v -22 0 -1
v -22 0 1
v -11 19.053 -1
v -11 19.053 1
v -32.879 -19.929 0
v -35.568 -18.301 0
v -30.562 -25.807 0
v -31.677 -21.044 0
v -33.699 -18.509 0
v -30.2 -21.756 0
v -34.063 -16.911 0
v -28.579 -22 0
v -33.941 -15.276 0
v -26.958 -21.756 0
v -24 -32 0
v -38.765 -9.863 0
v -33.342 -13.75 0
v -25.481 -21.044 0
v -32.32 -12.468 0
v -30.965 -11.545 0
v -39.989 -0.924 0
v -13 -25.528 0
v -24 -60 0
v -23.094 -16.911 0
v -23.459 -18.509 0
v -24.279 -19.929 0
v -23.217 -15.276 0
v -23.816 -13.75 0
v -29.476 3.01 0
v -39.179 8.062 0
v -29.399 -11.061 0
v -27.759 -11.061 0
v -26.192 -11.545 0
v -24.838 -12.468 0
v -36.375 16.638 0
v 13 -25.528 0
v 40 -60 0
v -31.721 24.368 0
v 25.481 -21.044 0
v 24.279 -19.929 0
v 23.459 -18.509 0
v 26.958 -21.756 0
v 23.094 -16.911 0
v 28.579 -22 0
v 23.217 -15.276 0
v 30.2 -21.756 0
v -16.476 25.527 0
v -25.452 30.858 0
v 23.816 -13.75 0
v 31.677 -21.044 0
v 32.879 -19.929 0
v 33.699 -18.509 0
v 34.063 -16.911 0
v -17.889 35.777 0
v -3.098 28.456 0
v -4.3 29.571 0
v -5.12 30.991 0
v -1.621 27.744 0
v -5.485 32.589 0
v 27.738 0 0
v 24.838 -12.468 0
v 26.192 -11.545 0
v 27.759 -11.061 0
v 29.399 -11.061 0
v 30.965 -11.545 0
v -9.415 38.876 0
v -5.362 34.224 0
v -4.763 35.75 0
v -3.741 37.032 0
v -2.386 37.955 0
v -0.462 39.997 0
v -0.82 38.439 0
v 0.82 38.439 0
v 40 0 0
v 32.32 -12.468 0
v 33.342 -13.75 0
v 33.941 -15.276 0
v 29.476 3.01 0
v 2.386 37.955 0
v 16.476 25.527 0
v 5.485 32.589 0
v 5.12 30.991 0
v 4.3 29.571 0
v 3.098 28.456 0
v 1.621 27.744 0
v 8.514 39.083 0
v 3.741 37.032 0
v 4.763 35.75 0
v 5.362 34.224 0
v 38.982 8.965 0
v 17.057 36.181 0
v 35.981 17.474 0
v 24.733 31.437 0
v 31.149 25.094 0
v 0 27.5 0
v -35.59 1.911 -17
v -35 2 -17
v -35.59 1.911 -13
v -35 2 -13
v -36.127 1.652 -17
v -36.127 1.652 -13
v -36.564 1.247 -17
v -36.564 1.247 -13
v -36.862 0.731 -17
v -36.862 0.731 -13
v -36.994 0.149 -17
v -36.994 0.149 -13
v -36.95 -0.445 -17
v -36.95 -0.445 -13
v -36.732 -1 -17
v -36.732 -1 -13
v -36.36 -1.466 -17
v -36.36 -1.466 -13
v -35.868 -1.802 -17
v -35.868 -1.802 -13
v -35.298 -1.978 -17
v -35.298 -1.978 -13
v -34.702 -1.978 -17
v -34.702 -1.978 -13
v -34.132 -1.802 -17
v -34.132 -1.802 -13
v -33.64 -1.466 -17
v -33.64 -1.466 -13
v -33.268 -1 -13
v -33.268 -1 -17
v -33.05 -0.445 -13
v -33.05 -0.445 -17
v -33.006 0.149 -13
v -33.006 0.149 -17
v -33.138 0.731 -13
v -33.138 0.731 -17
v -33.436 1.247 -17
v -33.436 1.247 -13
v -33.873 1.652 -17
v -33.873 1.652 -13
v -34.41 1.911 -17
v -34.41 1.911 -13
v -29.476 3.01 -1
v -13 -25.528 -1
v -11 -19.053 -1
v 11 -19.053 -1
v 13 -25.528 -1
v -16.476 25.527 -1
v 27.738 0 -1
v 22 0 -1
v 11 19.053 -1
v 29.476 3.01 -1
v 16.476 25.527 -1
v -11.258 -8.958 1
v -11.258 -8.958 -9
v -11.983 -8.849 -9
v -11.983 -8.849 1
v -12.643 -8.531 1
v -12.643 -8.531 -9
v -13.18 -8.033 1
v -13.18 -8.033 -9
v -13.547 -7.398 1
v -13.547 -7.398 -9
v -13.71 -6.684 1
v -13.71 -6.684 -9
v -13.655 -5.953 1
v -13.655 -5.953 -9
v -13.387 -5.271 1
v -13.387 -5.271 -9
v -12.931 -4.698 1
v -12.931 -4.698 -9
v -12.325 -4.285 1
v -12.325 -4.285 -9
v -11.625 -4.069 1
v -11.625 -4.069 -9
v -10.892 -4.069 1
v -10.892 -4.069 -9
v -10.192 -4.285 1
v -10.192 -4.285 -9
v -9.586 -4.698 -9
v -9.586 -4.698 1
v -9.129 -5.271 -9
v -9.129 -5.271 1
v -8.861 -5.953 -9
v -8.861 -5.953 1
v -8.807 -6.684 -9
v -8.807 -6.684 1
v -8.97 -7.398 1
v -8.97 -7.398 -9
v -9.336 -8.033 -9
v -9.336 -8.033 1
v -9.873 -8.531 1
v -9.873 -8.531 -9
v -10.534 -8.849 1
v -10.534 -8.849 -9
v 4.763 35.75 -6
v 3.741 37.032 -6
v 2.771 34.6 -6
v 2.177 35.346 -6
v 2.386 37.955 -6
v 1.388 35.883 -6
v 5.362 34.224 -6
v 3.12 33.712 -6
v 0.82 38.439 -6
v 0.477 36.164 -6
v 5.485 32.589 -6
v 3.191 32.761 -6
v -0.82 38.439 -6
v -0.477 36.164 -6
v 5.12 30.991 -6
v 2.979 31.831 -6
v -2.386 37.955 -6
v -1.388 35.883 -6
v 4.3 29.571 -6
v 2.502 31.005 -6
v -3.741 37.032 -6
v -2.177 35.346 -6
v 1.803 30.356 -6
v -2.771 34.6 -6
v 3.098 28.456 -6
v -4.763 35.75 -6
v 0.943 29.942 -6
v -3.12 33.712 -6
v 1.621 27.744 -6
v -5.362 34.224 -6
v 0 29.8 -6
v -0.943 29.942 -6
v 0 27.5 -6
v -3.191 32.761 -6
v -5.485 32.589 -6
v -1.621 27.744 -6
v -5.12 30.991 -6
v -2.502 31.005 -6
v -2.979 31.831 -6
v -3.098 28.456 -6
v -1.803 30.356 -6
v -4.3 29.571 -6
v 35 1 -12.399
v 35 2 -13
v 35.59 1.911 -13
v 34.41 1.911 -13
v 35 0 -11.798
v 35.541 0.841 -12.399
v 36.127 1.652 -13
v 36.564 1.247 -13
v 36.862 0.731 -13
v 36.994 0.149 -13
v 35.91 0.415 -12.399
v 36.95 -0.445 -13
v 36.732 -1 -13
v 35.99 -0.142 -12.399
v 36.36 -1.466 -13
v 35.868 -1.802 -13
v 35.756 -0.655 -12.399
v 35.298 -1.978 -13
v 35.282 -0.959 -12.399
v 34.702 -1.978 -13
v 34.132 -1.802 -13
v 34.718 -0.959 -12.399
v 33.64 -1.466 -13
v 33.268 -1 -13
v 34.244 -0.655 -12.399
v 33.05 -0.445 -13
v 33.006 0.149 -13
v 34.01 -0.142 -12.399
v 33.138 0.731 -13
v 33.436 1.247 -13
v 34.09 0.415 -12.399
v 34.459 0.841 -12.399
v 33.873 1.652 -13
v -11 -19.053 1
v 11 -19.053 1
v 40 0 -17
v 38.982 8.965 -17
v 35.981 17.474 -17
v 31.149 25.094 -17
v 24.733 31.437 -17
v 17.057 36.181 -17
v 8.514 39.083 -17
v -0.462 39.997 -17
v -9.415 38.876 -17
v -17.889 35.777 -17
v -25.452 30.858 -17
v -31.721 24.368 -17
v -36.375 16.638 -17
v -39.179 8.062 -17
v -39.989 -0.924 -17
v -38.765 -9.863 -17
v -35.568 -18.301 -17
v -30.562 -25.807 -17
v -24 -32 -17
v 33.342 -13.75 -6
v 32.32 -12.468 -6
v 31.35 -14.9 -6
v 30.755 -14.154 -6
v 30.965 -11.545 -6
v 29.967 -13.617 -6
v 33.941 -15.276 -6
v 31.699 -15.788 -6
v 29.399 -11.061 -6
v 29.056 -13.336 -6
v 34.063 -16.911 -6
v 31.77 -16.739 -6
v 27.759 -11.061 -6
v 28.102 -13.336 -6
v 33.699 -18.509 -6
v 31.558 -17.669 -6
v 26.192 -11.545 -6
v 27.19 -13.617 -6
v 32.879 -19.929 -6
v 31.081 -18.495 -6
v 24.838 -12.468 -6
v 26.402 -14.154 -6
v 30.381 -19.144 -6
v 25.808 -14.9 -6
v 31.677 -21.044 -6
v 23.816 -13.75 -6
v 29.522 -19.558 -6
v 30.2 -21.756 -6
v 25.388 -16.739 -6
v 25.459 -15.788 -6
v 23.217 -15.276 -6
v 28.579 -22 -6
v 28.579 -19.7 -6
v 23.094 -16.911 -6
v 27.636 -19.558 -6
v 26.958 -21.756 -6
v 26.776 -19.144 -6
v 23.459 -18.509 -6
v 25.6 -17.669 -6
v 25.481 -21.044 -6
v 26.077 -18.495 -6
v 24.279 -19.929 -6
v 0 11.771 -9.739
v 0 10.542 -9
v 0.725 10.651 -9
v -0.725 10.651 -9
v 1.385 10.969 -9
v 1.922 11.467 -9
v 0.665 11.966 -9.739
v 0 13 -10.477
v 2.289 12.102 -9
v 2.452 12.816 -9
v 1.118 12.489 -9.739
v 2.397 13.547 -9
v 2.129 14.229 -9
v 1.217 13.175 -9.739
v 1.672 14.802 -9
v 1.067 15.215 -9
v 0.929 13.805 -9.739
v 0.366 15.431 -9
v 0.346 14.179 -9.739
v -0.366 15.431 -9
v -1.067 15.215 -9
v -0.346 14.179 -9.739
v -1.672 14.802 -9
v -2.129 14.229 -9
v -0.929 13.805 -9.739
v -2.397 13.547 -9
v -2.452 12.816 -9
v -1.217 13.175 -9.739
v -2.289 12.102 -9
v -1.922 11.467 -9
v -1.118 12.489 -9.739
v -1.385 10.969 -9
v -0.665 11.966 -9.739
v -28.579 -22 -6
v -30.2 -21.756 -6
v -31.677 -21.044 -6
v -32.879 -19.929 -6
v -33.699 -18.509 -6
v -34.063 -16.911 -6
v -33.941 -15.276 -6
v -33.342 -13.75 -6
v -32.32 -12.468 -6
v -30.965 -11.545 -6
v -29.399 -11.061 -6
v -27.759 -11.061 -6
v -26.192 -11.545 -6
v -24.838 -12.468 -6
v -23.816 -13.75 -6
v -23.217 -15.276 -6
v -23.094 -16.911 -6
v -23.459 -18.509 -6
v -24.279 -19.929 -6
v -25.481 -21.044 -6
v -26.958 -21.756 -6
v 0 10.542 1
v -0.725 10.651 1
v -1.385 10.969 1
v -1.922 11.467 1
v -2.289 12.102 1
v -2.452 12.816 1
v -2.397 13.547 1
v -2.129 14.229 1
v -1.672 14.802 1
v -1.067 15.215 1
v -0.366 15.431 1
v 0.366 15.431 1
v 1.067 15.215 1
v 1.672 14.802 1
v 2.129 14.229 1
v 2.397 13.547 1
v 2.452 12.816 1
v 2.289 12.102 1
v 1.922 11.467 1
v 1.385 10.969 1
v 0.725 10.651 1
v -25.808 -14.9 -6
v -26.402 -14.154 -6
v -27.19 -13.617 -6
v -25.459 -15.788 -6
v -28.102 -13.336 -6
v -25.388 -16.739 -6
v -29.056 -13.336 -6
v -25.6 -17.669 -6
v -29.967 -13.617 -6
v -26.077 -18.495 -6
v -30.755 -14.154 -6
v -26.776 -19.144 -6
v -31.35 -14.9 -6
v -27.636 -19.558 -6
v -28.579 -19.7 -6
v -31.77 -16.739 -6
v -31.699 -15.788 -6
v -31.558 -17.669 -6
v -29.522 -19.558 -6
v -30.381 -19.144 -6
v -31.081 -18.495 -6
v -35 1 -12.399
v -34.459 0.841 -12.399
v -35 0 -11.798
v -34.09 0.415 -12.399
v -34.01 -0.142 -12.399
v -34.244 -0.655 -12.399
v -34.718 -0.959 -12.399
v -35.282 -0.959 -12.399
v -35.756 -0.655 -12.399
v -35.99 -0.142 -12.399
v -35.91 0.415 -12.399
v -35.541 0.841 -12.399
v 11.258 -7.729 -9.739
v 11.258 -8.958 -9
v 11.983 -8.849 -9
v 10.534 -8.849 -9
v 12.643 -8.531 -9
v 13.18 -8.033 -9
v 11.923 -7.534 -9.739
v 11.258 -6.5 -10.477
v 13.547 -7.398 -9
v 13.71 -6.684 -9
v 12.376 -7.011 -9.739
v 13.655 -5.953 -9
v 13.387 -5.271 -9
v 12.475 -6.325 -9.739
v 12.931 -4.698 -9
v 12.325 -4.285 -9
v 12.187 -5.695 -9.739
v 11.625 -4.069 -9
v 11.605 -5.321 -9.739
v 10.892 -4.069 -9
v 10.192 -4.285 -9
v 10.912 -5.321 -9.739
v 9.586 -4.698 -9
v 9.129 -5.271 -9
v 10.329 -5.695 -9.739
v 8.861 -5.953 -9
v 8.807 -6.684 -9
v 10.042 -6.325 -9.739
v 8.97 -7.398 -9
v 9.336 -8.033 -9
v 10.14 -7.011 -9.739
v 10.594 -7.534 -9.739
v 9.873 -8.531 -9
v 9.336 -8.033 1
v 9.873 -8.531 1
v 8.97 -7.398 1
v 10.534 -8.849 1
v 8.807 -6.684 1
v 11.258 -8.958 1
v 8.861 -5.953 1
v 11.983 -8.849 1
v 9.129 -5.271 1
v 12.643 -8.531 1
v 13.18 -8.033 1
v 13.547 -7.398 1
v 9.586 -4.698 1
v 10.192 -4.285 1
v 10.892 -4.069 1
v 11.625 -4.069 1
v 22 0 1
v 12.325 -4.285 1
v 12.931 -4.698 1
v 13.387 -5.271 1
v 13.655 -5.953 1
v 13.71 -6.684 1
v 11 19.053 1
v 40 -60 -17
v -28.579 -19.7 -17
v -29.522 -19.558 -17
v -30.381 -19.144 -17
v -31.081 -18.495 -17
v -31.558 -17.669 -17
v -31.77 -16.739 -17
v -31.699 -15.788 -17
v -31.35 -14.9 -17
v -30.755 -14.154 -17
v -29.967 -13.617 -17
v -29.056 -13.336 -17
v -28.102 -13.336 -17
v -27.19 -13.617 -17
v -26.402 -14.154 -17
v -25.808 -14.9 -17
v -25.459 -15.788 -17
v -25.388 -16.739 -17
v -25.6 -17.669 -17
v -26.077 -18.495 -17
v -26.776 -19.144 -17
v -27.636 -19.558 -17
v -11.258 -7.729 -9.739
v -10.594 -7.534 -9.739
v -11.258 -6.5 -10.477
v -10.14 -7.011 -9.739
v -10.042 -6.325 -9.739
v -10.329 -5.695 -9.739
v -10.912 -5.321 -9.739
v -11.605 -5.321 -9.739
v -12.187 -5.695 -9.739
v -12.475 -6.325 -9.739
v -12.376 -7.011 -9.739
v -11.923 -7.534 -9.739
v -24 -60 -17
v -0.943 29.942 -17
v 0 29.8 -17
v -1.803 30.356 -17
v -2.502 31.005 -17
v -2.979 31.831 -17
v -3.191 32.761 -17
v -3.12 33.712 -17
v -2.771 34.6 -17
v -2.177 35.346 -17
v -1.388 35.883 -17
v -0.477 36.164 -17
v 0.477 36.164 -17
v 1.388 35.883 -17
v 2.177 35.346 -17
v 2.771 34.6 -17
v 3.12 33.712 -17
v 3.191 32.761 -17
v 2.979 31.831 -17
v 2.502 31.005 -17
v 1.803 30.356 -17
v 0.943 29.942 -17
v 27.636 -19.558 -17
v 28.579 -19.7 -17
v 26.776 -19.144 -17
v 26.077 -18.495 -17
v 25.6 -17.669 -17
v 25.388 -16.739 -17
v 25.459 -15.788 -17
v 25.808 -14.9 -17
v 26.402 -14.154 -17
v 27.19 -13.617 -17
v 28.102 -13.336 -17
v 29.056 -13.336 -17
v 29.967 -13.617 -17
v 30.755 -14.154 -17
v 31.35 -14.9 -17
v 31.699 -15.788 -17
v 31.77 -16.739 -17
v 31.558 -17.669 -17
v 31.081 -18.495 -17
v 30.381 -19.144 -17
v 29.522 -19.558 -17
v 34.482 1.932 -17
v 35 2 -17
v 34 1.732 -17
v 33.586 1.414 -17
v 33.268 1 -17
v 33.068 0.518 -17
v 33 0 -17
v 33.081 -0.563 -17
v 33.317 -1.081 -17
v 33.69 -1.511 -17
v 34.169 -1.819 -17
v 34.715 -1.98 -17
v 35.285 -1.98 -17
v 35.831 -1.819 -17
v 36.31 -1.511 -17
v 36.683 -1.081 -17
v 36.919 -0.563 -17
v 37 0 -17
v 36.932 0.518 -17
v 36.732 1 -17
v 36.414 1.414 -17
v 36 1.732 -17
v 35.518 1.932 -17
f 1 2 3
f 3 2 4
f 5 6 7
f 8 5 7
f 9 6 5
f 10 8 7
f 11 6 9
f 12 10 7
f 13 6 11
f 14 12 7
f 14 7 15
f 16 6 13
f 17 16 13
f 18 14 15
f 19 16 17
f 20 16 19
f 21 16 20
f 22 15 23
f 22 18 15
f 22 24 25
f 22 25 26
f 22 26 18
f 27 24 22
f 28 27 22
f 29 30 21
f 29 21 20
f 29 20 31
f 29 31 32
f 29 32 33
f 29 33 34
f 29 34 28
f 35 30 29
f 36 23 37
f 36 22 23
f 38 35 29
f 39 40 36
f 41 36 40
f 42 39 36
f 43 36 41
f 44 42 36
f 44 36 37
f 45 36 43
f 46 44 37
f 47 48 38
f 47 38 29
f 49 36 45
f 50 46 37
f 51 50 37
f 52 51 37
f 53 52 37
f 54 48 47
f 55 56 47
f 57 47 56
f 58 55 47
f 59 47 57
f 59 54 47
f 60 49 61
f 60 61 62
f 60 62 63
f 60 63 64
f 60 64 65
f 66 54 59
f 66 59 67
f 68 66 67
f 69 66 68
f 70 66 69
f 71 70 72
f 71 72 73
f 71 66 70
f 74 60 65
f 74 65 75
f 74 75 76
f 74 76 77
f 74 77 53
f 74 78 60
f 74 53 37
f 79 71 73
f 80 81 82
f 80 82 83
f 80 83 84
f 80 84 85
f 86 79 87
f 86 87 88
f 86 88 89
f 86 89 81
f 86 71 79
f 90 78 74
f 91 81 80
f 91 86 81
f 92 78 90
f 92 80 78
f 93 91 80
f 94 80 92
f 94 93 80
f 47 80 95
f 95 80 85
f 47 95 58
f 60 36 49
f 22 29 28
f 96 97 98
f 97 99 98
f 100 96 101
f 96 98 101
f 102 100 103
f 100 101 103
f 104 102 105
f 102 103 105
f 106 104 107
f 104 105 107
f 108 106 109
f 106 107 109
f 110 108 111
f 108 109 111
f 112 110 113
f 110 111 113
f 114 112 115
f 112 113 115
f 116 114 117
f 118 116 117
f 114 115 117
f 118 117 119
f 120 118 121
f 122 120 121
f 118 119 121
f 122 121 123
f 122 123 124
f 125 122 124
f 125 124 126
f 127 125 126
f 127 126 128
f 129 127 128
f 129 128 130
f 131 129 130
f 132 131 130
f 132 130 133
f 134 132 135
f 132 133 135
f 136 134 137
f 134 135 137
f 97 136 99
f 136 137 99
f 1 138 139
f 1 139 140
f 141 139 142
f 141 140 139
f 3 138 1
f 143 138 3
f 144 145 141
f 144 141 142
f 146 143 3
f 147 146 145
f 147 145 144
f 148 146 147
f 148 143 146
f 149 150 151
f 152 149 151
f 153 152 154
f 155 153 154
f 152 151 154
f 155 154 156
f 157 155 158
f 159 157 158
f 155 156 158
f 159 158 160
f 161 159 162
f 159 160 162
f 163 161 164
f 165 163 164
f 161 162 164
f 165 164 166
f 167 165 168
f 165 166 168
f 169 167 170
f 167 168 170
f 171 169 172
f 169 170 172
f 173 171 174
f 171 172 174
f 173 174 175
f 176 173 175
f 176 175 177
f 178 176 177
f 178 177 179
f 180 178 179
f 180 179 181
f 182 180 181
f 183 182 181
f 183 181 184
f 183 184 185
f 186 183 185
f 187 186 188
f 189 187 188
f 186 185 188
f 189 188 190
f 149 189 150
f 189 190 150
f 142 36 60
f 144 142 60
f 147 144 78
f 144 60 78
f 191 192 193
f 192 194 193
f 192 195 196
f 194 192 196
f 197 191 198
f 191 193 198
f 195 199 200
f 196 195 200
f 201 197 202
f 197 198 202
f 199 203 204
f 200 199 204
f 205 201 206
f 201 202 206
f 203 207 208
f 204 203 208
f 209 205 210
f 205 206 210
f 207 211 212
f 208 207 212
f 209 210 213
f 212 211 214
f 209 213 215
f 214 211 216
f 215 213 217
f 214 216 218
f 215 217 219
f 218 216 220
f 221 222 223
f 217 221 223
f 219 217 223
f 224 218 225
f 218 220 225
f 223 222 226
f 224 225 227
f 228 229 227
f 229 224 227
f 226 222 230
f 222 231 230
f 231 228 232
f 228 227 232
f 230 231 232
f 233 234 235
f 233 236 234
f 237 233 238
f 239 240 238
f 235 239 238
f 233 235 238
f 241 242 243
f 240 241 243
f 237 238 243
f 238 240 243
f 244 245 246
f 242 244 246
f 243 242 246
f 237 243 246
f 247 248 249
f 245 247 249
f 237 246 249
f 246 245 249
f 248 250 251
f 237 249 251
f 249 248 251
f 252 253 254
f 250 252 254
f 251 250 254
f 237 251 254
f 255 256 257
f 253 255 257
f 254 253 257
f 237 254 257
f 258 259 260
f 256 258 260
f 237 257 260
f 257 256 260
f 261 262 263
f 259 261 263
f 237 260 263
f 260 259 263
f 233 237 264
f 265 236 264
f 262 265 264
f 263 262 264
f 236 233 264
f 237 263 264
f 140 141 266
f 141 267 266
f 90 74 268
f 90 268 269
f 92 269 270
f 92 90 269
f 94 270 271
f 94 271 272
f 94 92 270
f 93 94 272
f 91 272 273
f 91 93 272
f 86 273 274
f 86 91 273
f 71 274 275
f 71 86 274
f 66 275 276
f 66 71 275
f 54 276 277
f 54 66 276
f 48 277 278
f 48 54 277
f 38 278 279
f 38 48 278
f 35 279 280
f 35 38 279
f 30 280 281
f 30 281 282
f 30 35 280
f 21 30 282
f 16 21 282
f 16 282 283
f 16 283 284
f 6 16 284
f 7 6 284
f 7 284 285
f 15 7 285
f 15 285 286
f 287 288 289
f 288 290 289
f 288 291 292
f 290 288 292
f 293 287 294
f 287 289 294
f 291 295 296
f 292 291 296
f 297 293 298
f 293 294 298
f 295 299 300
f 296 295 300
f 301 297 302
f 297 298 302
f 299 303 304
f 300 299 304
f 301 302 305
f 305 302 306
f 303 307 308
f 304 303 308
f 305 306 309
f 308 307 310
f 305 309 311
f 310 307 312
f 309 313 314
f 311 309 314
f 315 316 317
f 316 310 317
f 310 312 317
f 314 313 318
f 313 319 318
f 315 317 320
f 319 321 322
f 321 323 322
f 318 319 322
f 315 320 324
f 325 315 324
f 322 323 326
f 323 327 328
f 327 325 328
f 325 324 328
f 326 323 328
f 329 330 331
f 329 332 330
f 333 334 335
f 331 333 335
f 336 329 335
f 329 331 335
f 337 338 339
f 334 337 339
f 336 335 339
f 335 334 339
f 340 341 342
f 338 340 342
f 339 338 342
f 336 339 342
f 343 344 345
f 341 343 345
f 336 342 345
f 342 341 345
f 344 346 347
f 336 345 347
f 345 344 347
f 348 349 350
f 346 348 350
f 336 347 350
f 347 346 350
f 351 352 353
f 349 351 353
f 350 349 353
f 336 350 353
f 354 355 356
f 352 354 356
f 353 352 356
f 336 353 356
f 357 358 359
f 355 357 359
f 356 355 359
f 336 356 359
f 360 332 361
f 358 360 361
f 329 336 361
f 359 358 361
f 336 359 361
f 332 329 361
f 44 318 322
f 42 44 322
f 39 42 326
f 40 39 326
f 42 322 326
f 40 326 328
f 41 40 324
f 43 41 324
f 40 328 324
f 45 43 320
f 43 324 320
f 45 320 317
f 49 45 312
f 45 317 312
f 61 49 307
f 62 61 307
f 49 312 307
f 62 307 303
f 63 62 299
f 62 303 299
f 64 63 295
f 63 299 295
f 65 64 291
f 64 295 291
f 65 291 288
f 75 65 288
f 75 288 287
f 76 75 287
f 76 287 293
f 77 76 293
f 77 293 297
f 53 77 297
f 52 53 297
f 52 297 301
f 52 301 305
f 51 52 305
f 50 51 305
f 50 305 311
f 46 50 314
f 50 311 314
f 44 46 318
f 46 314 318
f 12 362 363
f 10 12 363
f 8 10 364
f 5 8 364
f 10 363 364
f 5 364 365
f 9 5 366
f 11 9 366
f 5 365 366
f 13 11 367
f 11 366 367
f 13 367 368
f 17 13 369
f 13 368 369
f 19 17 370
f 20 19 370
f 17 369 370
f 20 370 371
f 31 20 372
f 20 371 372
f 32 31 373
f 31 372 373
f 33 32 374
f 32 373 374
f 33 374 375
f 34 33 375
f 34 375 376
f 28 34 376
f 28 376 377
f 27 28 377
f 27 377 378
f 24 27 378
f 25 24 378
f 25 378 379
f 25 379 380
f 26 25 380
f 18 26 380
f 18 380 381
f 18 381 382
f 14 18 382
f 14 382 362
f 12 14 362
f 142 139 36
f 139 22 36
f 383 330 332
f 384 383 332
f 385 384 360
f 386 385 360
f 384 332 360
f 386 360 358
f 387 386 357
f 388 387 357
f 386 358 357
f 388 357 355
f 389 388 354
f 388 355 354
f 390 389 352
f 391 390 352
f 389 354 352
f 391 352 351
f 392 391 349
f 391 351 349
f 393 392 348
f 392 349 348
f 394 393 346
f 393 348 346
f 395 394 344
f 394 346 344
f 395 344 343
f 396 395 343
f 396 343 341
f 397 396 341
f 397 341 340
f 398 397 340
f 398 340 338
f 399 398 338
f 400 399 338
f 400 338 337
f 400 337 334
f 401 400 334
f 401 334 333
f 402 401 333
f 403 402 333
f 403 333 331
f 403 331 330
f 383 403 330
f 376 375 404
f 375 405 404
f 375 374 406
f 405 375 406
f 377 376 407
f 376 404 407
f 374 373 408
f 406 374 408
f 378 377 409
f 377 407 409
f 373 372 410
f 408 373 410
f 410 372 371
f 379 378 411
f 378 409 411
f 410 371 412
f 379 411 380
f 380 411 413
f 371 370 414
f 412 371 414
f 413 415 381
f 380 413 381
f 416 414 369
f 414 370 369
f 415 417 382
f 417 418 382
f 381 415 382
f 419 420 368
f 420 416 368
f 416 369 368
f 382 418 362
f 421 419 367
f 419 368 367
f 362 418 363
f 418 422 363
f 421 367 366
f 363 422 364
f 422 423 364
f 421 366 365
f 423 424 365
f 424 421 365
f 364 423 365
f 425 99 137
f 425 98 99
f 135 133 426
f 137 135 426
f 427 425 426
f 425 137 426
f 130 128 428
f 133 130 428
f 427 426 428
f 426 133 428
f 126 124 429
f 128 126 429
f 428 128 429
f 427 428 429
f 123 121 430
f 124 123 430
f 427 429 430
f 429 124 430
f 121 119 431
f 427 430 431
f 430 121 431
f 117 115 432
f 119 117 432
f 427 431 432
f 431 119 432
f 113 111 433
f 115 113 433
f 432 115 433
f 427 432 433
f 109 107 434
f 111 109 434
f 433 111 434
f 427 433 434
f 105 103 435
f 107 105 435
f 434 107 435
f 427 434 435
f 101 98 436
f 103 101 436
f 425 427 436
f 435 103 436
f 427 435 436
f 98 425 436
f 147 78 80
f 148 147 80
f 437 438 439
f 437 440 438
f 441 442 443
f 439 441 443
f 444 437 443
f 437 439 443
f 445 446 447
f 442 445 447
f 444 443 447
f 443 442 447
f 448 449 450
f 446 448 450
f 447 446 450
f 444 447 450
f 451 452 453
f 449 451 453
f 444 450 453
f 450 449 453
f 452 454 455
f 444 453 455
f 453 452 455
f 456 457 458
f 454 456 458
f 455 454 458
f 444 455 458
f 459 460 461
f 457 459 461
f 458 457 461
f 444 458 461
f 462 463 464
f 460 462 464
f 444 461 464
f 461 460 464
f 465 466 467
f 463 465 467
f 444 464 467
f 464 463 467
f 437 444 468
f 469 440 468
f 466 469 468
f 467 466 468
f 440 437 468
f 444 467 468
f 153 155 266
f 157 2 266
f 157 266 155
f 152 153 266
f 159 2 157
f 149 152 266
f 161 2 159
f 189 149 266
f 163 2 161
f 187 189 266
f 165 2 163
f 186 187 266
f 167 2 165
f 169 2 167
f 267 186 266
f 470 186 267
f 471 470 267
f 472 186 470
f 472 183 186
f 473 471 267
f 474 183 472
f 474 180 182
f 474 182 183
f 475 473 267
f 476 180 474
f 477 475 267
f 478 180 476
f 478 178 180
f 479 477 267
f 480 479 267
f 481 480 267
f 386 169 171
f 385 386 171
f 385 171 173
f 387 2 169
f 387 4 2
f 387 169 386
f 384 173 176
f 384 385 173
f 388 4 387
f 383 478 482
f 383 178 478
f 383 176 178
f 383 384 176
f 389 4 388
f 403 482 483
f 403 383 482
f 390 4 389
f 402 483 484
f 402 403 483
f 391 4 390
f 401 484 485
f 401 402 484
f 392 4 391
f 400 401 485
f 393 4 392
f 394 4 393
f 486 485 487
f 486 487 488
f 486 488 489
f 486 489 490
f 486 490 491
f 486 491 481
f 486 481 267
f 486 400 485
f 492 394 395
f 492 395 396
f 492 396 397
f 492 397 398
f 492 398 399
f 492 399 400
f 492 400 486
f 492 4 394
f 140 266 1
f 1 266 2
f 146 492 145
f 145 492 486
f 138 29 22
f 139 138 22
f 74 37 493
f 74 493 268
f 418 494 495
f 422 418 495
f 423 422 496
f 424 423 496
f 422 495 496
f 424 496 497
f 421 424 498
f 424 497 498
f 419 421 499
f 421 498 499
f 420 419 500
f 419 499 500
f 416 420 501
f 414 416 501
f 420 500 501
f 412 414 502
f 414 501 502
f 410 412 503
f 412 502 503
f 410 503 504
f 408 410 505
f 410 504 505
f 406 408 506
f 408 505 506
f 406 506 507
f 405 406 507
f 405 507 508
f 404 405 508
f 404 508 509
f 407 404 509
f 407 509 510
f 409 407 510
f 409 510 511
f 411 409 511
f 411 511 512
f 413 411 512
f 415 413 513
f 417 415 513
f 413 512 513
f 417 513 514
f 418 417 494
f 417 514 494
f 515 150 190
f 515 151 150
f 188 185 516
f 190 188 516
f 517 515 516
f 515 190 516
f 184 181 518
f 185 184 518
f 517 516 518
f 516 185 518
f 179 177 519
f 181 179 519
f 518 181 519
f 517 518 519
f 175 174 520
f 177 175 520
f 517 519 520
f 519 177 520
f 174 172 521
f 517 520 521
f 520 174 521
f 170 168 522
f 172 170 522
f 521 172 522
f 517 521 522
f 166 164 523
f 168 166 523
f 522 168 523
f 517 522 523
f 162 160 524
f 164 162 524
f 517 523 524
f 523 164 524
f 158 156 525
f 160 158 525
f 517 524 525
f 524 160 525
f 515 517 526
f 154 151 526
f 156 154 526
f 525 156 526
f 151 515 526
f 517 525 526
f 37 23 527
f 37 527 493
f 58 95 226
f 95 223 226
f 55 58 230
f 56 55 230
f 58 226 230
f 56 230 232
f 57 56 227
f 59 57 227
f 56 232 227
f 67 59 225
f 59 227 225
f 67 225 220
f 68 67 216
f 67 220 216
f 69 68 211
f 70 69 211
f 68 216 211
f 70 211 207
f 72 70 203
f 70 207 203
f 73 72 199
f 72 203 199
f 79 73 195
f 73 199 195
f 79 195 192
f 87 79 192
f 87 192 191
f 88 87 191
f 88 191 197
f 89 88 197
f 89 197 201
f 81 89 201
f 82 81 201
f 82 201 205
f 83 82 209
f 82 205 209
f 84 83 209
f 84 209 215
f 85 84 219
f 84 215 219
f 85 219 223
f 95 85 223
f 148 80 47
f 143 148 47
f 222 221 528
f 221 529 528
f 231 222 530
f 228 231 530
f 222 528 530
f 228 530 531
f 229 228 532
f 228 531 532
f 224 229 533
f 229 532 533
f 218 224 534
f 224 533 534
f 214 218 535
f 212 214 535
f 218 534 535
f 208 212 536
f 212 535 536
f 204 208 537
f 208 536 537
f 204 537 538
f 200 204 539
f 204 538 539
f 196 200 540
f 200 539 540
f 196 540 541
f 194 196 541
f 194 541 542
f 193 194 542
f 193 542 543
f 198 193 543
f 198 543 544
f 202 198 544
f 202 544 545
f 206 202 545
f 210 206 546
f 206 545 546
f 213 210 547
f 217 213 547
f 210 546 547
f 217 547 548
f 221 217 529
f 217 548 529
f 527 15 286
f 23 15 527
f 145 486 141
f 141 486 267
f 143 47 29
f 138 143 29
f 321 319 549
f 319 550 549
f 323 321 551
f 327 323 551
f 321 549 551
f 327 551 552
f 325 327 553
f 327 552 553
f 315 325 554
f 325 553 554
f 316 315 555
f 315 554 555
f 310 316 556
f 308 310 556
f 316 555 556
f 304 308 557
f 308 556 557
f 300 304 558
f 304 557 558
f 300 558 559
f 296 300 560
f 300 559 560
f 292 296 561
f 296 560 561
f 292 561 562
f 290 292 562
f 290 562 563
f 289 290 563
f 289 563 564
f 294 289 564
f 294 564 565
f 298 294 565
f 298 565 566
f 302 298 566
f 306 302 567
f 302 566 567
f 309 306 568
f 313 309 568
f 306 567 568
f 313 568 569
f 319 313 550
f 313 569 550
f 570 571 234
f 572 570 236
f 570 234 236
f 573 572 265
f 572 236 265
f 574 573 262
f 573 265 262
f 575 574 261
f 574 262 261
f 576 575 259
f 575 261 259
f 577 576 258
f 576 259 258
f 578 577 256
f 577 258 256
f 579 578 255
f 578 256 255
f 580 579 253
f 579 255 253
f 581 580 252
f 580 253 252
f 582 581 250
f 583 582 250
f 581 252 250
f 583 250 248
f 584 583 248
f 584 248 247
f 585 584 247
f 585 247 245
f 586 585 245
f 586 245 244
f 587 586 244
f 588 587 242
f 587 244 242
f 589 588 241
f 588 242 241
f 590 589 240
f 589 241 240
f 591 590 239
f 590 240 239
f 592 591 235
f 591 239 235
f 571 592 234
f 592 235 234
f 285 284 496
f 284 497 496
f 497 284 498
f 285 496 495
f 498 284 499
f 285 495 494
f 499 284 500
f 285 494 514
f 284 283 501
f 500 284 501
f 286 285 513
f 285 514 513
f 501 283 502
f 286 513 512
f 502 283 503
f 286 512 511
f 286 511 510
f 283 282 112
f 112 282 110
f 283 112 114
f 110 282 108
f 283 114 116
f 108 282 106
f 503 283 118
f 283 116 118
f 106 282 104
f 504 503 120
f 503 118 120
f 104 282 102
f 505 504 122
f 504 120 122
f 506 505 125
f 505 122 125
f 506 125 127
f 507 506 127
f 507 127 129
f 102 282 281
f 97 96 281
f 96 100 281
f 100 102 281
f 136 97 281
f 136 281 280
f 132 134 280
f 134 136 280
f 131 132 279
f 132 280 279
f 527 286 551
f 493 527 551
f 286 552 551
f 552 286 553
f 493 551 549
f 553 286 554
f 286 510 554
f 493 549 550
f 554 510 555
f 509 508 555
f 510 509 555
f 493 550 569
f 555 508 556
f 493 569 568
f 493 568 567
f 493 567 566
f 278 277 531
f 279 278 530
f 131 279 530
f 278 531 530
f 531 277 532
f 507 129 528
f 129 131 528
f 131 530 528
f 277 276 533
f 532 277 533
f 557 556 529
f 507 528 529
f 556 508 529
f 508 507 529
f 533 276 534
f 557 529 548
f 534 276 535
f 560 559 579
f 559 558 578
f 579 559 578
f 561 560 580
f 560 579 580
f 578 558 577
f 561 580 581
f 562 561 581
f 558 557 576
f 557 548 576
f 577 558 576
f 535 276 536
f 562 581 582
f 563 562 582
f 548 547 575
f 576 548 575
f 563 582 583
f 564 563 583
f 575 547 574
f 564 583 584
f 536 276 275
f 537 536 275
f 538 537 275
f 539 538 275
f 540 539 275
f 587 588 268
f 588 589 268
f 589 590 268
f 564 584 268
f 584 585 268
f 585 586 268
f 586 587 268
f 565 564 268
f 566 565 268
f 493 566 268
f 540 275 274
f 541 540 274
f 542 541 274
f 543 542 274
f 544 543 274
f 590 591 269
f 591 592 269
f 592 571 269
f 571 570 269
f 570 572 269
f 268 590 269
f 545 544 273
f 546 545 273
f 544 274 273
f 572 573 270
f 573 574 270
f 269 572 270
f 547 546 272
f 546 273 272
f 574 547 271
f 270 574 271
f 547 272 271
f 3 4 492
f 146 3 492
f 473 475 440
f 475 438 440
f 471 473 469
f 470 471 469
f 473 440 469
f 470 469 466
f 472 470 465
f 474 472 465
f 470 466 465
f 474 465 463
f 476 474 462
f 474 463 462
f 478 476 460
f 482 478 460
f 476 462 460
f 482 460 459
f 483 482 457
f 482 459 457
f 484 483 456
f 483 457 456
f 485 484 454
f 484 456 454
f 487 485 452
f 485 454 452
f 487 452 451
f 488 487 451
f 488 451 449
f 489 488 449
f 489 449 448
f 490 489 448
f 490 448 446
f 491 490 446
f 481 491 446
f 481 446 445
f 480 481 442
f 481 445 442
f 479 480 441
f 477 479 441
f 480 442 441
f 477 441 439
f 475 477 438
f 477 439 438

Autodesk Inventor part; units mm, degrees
ref_plane "YZ Plane" through (0, 0, 0) normal (1, 0, 0) x (0, 1, 0)
ref_plane "XZ Plane" through (0, 0, 0) normal (0, 1, 0) x (-1, 0, 0)
ref_plane "XY Plane" through (0, 0, 0) normal (0, 0, 1) x (1, 0, 0)
sketch "スケッチ1" plane through (0, 0, 0) normal (0, 0, 1) x (1, 0, 0)
  arc A0 (40, 0) -> (-24, -32) centre (0, 0) ccw
  line L0 (40, 0) -> (-24, 0)
  line L1 (-24, -32) -> (-24, -60)
  line L2 (-24, -60) -> (40, -60)
  line L3 (40, -60) -> (40, 0)
  circle A1 centre (0, 0) radius 33
  line L4 (-22, 0) -> (-11, 19.0526)
  line L5 (-11, 19.0526) -> (11, 19.0526)
  line L6 (11, 19.0526) -> (22, 0)
  line L7 (22, 0) -> (11, -19.0526)
  line L8 (11, -19.0526) -> (-11, -19.0526)
  line L9 (-11, -19.0526) -> (-22, 0)
  line L10 (-13, -25.5275) -> (13, -25.5275)
  line L11 (13, -25.5275) -> (29.4764, 3.0105)
  line L12 (29.4764, 3.0105) -> (16.4764, 25.5271)
  line L13 (16.4764, 25.5271) -> (-16.4764, 25.5271)
  line L14 (-16.4764, 25.5271) -> (-29.4764, 3.0105)
  line L15 (-29.4764, 3.0105) -> (-13, -25.5275)
  point P0 (-24, -32)
  point P1 (0, 33)
  point P2 (-28.5788, -16.5)
  point P3 (28.5788, -16.5)
  dimension "d34" = 66
  dimension "d0" = 80
  dimension "d1" = 0
  dimension "d2" = 64
  dimension "d3" = 60
  dimension "d35" = 0
  dimension "d38" = 360
  dimension "d62" = 22
  dimension "d94" = 0
  dimension "d95" = 26
  dimension "d96" = 120
  dimension "d97" = 26
  dimension "d98" = 120
  dimension "d99" = 120
  dimension "d100" = 26
  dimension "d101" = 120
  dimension "d102" = 13
  dimension "d103" = 25.5275
extrude "押し出し1" add sketch "スケッチ1" against normal blind 17 contours L3 L2 L1 A0 | L7 L8 L9 L0 | L0 L4 L5 L6 | L11 L10 L15 L14 L13 L12 | A1
hole "穴3" at (0, 33, 0) at (-28.5788, -16.5, 0) at (28.5788, -16.5, 0) direction (0, 0, -1) diameter 6.4 depth 17 tip angle 118 counterbore diameter 11 counterbore depth 6
sketch "スケッチ2" plane through (0, 0, -17) normal (0, 0, -1) x (-1, 0, 0)
  circle A0 centre (0, 0) radius 35
  point P0 (-35, 0)
  point P1 (35, 0)
  dimension "d47" = 70
  dimension "d48" = 0
  dimension "d51" = 360
hole "穴4" at (35, 0, -17) at (-35, 0, -17) direction (0, 0, 1) diameter 4 depth 4 tip angle 118
extrude "押し出し2" add sketch "スケッチ1" along normal blind 1 contours L7 L8 L9 L0 | L0 L4 L5 L6
sketch "スケッチ4" plane through (0, 0, 1) normal (0, 0, 1) x (1, 0, 0)
  circle A0 centre (0, 0) radius 13
  point P0 (0, 13)
  point P1 (-11.2583, -6.5)
  point P2 (11.2583, -6.5)
  dimension "d81" = 26
  dimension "d82" = 0
  dimension "d85" = 360
hole "穴5" at (0, 13, 1) at (-11.2583, -6.5, 1) at (11.2583, -6.5, 1) direction (0, 0, -1) diameter 4.917 depth 10 tip angle 118 thread size "M6x1" designation "M6" class "6H" standard "GB Metric profile"
extrude "押し出し3" cut sketch "スケッチ1" against normal blind 1 contours L11 L10 L15 L14 L13 L12
properties part number "FFS080YS102U6" material "ステンレス鋼"
